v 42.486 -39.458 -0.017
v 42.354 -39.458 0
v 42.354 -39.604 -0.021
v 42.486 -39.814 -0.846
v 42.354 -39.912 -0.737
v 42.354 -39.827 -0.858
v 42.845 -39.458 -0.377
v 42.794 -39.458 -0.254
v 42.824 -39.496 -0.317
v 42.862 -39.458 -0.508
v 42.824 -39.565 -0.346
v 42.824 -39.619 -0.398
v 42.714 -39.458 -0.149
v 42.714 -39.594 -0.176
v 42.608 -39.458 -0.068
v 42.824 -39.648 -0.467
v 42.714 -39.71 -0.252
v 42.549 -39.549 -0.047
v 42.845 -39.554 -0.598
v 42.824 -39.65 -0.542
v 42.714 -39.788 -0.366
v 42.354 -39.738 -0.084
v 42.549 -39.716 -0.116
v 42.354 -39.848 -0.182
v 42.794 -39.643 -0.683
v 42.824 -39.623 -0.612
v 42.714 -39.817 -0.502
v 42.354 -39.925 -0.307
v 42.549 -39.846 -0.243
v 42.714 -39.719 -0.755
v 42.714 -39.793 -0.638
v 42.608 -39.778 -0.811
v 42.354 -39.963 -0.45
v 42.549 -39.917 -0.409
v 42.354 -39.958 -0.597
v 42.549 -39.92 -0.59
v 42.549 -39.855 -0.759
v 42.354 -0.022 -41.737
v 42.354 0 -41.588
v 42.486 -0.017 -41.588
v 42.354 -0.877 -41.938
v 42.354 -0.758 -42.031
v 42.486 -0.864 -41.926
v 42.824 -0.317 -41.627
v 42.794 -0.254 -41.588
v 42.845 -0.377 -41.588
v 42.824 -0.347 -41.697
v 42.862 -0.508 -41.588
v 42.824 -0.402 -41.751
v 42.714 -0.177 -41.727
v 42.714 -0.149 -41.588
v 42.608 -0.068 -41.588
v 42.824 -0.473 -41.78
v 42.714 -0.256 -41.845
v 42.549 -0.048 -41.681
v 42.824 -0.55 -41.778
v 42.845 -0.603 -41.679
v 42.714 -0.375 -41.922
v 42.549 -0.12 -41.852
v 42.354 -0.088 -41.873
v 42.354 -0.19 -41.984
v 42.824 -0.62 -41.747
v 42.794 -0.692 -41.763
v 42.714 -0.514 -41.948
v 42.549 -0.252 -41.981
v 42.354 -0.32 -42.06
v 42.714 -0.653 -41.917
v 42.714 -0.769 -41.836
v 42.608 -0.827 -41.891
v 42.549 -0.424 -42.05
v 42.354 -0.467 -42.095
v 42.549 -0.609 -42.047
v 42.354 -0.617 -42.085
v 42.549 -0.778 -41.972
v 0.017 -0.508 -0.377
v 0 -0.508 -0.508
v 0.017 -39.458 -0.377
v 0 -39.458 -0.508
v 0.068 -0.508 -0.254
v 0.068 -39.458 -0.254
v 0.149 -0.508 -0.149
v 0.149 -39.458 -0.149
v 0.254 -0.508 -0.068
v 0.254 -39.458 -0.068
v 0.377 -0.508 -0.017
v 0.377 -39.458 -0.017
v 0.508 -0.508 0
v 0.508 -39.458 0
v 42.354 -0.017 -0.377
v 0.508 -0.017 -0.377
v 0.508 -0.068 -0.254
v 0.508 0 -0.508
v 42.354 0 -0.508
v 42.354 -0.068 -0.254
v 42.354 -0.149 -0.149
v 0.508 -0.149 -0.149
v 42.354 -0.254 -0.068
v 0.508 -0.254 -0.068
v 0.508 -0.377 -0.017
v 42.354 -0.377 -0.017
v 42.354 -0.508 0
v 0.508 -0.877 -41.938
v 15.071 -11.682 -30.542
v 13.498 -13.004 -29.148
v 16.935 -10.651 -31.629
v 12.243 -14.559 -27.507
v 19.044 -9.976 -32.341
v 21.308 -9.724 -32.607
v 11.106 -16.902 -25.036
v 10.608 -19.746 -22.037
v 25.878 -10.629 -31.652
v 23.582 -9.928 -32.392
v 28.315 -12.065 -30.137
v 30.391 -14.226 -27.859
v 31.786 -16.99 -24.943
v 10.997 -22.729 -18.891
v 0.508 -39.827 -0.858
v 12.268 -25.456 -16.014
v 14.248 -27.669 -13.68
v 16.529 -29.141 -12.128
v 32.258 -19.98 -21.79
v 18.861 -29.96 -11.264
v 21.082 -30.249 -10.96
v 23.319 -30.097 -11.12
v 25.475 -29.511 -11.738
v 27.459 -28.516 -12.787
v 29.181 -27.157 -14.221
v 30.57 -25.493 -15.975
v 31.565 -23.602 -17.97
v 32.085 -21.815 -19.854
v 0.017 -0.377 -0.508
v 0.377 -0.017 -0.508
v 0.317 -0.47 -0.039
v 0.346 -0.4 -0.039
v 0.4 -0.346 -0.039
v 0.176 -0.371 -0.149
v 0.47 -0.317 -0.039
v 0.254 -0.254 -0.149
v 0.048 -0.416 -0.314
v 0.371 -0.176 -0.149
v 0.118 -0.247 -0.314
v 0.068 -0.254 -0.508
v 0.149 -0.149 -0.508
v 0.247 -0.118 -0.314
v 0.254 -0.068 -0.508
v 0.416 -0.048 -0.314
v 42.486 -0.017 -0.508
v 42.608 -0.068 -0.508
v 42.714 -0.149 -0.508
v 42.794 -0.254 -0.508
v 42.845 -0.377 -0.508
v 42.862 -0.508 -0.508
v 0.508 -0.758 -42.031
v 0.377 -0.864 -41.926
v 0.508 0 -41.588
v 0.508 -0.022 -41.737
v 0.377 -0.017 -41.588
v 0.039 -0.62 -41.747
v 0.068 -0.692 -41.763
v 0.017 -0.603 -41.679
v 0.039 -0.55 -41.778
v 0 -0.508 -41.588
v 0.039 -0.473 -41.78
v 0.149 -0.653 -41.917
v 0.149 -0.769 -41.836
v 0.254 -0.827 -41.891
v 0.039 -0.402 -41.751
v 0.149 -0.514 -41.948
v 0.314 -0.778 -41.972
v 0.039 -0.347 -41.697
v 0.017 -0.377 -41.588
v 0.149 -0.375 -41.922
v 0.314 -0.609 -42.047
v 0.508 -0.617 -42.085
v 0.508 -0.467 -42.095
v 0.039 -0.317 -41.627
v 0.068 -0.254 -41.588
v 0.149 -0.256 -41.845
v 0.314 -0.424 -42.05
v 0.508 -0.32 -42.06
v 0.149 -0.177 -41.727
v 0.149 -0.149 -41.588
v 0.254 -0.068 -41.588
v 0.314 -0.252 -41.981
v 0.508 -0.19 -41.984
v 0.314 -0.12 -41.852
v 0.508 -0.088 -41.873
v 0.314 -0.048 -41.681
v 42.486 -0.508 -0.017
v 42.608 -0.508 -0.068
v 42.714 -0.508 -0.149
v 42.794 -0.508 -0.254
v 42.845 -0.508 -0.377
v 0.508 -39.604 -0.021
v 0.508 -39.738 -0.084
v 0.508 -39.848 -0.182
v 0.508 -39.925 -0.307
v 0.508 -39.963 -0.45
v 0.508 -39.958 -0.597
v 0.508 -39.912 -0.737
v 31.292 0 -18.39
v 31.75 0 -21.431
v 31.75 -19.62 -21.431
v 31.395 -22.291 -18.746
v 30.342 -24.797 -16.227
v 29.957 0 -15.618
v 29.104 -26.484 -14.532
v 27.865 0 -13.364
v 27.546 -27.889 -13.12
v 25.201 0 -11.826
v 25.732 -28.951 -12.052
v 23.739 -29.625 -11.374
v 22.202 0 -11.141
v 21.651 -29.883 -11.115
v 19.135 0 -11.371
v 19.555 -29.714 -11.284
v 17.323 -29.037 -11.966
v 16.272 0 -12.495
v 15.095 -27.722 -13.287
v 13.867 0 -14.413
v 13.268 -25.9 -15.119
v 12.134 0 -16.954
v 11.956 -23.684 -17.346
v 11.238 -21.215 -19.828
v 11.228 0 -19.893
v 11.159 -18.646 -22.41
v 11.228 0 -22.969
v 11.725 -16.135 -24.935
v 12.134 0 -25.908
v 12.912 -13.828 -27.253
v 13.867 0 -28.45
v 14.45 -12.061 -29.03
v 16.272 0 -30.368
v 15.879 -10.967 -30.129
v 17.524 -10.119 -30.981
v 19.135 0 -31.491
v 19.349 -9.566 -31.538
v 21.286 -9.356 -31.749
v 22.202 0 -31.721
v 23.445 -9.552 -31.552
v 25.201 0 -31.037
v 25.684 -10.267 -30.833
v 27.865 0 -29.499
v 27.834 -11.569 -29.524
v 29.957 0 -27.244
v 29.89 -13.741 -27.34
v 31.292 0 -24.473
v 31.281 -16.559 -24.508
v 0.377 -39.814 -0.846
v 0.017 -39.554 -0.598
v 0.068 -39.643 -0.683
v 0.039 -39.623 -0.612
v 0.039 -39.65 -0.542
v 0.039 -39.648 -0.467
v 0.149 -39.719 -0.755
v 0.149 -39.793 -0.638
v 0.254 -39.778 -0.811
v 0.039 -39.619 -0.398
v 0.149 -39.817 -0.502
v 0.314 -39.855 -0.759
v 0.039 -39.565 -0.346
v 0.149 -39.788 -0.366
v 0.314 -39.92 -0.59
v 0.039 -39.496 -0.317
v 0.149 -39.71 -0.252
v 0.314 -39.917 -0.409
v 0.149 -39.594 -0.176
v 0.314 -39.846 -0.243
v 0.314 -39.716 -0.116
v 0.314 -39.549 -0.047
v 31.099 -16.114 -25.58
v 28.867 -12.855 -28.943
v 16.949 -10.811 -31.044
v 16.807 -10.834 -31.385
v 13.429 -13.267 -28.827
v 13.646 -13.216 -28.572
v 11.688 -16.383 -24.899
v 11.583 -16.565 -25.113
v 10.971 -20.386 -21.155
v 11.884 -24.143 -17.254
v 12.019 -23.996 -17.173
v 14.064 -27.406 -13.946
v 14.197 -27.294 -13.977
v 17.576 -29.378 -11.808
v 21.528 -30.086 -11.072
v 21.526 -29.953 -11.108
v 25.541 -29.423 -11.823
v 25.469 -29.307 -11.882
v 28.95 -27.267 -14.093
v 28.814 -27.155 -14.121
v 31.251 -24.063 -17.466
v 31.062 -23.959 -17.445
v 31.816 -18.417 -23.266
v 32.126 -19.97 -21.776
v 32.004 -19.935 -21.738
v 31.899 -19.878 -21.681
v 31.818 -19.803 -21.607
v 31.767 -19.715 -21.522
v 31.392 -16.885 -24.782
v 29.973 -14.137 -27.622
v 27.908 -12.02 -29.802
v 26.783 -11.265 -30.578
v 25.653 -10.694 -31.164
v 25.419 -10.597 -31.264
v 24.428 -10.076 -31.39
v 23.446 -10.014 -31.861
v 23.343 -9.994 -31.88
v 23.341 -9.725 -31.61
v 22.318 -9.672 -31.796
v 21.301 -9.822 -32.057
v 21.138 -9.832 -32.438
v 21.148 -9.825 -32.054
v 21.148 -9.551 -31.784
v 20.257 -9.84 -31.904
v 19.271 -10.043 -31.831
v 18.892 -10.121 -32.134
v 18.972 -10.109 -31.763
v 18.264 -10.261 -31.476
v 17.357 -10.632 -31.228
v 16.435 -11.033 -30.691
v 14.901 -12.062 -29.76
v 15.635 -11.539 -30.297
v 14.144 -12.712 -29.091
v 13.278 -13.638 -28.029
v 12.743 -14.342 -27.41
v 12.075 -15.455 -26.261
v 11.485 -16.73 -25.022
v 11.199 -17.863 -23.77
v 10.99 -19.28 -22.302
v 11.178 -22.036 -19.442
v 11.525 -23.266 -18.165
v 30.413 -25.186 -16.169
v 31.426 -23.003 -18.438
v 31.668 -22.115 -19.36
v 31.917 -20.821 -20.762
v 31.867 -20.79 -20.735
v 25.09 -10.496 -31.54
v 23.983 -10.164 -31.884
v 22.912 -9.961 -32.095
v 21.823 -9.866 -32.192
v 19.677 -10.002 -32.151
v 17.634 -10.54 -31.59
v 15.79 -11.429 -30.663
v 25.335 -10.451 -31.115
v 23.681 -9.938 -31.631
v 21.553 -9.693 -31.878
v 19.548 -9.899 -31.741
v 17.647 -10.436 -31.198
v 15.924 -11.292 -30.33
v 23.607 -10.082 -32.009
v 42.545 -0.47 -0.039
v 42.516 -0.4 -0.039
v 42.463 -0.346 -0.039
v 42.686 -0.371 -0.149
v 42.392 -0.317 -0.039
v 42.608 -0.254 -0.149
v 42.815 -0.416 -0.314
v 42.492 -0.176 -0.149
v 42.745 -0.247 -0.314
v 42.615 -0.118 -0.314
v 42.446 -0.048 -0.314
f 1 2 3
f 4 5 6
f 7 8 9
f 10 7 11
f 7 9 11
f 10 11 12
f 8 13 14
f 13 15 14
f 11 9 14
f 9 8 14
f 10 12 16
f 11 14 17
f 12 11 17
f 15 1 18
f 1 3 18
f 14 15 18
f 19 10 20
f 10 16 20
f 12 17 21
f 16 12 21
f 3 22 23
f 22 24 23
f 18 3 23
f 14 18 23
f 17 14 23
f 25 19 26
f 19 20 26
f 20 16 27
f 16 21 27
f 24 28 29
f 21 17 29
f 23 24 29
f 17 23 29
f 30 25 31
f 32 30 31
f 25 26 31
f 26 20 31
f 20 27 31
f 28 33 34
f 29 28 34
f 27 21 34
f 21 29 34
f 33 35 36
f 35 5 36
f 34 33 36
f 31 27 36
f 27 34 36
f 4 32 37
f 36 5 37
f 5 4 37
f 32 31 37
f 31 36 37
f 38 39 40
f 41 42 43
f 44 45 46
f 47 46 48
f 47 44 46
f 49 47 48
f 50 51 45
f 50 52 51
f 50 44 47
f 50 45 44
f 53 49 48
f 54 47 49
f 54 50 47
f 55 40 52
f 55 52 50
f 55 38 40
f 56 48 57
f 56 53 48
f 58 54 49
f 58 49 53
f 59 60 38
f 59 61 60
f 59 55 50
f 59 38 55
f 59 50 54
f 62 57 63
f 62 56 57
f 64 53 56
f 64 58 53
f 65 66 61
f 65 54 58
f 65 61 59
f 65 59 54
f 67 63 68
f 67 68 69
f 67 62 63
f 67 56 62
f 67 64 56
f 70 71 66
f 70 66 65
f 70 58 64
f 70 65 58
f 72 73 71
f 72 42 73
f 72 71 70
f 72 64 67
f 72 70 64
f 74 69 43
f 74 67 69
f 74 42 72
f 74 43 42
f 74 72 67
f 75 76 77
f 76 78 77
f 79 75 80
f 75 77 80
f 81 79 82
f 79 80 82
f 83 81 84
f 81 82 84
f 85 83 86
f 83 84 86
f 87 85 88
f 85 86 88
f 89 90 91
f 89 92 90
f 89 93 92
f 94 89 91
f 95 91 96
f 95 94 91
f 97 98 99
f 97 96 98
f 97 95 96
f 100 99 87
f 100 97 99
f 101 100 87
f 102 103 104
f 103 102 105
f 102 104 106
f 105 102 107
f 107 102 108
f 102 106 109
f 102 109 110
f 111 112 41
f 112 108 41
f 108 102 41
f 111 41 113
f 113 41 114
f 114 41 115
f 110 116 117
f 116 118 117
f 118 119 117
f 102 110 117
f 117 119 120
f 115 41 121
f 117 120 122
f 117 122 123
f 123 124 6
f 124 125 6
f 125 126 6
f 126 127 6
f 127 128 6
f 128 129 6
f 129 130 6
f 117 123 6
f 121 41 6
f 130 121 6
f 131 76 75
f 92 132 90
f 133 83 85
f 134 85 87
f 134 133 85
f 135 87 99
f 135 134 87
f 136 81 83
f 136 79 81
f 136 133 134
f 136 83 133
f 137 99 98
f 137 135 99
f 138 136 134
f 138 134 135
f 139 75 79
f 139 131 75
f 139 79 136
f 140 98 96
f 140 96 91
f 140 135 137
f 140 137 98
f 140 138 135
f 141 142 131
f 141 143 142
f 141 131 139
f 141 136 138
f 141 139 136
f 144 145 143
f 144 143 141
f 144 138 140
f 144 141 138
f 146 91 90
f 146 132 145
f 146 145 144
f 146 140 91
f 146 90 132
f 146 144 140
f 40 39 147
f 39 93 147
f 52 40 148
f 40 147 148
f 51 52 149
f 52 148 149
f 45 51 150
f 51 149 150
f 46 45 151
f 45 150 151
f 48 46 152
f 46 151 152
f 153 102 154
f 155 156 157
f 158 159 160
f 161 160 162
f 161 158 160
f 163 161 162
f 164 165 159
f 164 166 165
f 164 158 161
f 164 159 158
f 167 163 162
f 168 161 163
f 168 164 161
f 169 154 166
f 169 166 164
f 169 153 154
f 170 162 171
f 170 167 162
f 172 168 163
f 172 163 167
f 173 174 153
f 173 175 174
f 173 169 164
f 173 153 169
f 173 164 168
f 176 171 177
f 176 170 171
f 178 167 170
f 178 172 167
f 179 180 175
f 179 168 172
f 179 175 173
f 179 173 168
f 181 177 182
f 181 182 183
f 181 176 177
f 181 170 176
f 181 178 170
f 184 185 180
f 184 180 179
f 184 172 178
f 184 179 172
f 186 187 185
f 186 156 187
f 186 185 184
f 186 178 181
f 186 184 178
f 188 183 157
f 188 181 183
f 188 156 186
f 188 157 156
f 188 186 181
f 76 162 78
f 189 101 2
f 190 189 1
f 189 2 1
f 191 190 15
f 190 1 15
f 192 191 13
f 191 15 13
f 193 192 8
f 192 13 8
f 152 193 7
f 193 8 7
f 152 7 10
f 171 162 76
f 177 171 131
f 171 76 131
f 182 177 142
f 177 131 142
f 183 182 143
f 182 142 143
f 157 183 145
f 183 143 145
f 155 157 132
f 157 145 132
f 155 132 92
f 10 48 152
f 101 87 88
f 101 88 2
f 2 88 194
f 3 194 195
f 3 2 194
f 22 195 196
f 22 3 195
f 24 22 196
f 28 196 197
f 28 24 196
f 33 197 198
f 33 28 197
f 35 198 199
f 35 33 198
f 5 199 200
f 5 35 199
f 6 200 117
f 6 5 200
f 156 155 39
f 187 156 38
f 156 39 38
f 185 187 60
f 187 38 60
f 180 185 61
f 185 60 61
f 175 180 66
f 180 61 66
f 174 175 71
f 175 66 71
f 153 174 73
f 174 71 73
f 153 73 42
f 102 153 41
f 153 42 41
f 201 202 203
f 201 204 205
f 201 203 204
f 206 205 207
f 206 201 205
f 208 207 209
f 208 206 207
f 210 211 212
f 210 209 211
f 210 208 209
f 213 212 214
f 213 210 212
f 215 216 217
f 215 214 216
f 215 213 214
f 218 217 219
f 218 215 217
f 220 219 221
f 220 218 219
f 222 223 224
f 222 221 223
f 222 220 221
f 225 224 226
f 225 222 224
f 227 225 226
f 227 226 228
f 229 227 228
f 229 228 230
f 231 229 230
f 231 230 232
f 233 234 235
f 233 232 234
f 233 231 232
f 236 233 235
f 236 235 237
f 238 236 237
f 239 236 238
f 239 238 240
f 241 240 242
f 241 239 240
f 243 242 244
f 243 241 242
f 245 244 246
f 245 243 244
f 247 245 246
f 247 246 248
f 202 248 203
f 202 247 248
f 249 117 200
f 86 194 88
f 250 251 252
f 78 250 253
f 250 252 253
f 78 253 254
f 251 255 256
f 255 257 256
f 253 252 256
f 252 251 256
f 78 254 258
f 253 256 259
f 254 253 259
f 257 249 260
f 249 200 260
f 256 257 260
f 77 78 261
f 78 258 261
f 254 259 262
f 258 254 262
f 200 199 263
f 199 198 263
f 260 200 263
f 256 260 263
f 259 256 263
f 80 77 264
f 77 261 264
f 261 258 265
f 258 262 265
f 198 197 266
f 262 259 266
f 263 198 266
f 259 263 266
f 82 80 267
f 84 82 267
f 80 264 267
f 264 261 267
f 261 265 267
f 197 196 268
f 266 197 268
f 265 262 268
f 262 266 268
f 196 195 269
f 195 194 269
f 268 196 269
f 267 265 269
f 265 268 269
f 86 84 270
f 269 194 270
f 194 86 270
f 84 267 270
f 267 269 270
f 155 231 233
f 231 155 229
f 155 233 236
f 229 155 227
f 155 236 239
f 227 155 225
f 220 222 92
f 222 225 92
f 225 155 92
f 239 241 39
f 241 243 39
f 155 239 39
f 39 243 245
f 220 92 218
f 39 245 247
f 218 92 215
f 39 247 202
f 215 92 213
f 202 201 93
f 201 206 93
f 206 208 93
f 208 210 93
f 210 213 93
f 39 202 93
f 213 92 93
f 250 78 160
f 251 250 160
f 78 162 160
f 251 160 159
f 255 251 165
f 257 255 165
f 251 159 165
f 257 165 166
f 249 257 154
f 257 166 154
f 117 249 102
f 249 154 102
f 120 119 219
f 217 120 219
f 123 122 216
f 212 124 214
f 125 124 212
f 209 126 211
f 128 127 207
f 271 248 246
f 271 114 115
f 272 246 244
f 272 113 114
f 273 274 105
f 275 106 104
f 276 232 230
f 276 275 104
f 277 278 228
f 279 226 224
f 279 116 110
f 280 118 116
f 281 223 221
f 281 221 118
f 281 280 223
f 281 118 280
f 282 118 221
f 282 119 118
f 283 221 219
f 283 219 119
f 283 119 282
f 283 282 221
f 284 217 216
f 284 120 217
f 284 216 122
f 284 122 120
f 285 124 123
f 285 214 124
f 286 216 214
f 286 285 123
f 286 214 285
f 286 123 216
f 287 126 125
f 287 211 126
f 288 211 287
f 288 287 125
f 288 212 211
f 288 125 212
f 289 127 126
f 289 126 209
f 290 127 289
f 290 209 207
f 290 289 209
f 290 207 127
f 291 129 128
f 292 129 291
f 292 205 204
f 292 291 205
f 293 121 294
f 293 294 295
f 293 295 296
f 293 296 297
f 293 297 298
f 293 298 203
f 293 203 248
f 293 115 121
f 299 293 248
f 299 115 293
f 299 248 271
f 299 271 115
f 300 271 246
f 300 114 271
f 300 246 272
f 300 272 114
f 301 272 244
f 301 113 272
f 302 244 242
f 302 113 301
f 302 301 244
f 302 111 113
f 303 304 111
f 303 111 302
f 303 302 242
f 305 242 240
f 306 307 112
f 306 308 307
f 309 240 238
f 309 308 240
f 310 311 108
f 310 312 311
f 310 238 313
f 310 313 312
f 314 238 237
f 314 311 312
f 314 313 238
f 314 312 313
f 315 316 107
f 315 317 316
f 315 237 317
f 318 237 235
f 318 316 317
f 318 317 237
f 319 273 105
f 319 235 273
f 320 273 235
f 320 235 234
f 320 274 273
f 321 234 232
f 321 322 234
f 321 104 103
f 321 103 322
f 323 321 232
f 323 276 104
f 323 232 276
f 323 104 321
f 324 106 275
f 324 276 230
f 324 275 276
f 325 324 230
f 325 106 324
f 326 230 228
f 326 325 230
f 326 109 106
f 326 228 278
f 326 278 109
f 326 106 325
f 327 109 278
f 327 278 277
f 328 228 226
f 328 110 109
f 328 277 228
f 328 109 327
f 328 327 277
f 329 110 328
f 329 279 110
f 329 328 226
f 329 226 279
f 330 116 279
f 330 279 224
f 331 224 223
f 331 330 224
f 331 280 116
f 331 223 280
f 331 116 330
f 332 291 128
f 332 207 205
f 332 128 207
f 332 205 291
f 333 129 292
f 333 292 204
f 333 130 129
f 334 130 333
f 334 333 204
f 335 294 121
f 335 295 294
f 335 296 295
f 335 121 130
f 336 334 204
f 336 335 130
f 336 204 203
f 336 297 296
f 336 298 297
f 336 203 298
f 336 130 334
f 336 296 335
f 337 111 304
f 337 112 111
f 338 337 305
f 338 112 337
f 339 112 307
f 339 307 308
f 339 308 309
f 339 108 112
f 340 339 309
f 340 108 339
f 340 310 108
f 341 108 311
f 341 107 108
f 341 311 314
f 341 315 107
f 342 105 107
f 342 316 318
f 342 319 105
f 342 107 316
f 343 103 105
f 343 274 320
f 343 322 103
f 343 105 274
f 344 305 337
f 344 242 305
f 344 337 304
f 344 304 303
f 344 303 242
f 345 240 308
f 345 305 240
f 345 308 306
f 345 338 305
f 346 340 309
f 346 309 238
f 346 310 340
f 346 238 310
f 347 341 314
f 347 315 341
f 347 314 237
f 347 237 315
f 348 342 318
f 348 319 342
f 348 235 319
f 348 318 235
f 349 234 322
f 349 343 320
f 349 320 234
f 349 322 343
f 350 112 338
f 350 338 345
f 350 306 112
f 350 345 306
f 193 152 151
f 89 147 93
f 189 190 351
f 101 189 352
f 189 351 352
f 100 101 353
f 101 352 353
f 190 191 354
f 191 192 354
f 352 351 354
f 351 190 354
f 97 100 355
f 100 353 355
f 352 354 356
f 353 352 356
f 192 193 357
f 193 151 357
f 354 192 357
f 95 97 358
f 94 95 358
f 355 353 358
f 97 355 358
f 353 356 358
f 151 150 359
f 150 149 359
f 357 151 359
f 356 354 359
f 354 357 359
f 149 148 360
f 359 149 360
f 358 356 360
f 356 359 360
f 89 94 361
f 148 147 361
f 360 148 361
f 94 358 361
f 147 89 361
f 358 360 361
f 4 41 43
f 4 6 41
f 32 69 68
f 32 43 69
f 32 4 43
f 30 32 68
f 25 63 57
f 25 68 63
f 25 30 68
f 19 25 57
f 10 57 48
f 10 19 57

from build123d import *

# Parameters (mm, degrees)
F0_W     = 42.8625
F0_H     = 42.8625
F0_R     = 10.31875
F1_DEPTH = 40.64
F3_DEPTH = 42.8635
F4_R     = 0.508


with BuildPart() as f1:
    # F0 (on Front) → F1 (new body)
    with BuildSketch(Plane.XZ):
        with Locations((21.43125, -21.43125)):
            Rectangle(F0_W, F0_H)
        with Locations((21.43125, -21.43125)):
            Circle(F0_R, mode=Mode.SUBTRACT)
    extrude(amount=F1_DEPTH)

    # F2 (on face) → F3 (cut, through all)
    with BuildSketch(Plane.YZ.offset(42.8625)):
        Polygon((0, -42.8625), (-40.64, 0), (-40.64, -42.8625), align=None)
    extrude(amount=-F3_DEPTH, mode=Mode.SUBTRACT)

    # F4
    f4_edges = [f1.edges().sort_by_distance(p)[0] for p in [
        (42.8625, 0, -21.43125),
        (42.8625, -20.32, 0),
        (42.8625, -20.32, -21.43125),
        (21.43125, 0, -42.8625),
        (21.43125, -40.64, 0),
        (0, -20.32, -21.43125),
        (11.1125, -20.317825, -21.433544),
        (0, 0, -21.43125),
        (0, -20.32, 0),
        (21.43125, 0, 0),
    ]]
    fillet(f4_edges, radius=F4_R)


solid = f1.part
